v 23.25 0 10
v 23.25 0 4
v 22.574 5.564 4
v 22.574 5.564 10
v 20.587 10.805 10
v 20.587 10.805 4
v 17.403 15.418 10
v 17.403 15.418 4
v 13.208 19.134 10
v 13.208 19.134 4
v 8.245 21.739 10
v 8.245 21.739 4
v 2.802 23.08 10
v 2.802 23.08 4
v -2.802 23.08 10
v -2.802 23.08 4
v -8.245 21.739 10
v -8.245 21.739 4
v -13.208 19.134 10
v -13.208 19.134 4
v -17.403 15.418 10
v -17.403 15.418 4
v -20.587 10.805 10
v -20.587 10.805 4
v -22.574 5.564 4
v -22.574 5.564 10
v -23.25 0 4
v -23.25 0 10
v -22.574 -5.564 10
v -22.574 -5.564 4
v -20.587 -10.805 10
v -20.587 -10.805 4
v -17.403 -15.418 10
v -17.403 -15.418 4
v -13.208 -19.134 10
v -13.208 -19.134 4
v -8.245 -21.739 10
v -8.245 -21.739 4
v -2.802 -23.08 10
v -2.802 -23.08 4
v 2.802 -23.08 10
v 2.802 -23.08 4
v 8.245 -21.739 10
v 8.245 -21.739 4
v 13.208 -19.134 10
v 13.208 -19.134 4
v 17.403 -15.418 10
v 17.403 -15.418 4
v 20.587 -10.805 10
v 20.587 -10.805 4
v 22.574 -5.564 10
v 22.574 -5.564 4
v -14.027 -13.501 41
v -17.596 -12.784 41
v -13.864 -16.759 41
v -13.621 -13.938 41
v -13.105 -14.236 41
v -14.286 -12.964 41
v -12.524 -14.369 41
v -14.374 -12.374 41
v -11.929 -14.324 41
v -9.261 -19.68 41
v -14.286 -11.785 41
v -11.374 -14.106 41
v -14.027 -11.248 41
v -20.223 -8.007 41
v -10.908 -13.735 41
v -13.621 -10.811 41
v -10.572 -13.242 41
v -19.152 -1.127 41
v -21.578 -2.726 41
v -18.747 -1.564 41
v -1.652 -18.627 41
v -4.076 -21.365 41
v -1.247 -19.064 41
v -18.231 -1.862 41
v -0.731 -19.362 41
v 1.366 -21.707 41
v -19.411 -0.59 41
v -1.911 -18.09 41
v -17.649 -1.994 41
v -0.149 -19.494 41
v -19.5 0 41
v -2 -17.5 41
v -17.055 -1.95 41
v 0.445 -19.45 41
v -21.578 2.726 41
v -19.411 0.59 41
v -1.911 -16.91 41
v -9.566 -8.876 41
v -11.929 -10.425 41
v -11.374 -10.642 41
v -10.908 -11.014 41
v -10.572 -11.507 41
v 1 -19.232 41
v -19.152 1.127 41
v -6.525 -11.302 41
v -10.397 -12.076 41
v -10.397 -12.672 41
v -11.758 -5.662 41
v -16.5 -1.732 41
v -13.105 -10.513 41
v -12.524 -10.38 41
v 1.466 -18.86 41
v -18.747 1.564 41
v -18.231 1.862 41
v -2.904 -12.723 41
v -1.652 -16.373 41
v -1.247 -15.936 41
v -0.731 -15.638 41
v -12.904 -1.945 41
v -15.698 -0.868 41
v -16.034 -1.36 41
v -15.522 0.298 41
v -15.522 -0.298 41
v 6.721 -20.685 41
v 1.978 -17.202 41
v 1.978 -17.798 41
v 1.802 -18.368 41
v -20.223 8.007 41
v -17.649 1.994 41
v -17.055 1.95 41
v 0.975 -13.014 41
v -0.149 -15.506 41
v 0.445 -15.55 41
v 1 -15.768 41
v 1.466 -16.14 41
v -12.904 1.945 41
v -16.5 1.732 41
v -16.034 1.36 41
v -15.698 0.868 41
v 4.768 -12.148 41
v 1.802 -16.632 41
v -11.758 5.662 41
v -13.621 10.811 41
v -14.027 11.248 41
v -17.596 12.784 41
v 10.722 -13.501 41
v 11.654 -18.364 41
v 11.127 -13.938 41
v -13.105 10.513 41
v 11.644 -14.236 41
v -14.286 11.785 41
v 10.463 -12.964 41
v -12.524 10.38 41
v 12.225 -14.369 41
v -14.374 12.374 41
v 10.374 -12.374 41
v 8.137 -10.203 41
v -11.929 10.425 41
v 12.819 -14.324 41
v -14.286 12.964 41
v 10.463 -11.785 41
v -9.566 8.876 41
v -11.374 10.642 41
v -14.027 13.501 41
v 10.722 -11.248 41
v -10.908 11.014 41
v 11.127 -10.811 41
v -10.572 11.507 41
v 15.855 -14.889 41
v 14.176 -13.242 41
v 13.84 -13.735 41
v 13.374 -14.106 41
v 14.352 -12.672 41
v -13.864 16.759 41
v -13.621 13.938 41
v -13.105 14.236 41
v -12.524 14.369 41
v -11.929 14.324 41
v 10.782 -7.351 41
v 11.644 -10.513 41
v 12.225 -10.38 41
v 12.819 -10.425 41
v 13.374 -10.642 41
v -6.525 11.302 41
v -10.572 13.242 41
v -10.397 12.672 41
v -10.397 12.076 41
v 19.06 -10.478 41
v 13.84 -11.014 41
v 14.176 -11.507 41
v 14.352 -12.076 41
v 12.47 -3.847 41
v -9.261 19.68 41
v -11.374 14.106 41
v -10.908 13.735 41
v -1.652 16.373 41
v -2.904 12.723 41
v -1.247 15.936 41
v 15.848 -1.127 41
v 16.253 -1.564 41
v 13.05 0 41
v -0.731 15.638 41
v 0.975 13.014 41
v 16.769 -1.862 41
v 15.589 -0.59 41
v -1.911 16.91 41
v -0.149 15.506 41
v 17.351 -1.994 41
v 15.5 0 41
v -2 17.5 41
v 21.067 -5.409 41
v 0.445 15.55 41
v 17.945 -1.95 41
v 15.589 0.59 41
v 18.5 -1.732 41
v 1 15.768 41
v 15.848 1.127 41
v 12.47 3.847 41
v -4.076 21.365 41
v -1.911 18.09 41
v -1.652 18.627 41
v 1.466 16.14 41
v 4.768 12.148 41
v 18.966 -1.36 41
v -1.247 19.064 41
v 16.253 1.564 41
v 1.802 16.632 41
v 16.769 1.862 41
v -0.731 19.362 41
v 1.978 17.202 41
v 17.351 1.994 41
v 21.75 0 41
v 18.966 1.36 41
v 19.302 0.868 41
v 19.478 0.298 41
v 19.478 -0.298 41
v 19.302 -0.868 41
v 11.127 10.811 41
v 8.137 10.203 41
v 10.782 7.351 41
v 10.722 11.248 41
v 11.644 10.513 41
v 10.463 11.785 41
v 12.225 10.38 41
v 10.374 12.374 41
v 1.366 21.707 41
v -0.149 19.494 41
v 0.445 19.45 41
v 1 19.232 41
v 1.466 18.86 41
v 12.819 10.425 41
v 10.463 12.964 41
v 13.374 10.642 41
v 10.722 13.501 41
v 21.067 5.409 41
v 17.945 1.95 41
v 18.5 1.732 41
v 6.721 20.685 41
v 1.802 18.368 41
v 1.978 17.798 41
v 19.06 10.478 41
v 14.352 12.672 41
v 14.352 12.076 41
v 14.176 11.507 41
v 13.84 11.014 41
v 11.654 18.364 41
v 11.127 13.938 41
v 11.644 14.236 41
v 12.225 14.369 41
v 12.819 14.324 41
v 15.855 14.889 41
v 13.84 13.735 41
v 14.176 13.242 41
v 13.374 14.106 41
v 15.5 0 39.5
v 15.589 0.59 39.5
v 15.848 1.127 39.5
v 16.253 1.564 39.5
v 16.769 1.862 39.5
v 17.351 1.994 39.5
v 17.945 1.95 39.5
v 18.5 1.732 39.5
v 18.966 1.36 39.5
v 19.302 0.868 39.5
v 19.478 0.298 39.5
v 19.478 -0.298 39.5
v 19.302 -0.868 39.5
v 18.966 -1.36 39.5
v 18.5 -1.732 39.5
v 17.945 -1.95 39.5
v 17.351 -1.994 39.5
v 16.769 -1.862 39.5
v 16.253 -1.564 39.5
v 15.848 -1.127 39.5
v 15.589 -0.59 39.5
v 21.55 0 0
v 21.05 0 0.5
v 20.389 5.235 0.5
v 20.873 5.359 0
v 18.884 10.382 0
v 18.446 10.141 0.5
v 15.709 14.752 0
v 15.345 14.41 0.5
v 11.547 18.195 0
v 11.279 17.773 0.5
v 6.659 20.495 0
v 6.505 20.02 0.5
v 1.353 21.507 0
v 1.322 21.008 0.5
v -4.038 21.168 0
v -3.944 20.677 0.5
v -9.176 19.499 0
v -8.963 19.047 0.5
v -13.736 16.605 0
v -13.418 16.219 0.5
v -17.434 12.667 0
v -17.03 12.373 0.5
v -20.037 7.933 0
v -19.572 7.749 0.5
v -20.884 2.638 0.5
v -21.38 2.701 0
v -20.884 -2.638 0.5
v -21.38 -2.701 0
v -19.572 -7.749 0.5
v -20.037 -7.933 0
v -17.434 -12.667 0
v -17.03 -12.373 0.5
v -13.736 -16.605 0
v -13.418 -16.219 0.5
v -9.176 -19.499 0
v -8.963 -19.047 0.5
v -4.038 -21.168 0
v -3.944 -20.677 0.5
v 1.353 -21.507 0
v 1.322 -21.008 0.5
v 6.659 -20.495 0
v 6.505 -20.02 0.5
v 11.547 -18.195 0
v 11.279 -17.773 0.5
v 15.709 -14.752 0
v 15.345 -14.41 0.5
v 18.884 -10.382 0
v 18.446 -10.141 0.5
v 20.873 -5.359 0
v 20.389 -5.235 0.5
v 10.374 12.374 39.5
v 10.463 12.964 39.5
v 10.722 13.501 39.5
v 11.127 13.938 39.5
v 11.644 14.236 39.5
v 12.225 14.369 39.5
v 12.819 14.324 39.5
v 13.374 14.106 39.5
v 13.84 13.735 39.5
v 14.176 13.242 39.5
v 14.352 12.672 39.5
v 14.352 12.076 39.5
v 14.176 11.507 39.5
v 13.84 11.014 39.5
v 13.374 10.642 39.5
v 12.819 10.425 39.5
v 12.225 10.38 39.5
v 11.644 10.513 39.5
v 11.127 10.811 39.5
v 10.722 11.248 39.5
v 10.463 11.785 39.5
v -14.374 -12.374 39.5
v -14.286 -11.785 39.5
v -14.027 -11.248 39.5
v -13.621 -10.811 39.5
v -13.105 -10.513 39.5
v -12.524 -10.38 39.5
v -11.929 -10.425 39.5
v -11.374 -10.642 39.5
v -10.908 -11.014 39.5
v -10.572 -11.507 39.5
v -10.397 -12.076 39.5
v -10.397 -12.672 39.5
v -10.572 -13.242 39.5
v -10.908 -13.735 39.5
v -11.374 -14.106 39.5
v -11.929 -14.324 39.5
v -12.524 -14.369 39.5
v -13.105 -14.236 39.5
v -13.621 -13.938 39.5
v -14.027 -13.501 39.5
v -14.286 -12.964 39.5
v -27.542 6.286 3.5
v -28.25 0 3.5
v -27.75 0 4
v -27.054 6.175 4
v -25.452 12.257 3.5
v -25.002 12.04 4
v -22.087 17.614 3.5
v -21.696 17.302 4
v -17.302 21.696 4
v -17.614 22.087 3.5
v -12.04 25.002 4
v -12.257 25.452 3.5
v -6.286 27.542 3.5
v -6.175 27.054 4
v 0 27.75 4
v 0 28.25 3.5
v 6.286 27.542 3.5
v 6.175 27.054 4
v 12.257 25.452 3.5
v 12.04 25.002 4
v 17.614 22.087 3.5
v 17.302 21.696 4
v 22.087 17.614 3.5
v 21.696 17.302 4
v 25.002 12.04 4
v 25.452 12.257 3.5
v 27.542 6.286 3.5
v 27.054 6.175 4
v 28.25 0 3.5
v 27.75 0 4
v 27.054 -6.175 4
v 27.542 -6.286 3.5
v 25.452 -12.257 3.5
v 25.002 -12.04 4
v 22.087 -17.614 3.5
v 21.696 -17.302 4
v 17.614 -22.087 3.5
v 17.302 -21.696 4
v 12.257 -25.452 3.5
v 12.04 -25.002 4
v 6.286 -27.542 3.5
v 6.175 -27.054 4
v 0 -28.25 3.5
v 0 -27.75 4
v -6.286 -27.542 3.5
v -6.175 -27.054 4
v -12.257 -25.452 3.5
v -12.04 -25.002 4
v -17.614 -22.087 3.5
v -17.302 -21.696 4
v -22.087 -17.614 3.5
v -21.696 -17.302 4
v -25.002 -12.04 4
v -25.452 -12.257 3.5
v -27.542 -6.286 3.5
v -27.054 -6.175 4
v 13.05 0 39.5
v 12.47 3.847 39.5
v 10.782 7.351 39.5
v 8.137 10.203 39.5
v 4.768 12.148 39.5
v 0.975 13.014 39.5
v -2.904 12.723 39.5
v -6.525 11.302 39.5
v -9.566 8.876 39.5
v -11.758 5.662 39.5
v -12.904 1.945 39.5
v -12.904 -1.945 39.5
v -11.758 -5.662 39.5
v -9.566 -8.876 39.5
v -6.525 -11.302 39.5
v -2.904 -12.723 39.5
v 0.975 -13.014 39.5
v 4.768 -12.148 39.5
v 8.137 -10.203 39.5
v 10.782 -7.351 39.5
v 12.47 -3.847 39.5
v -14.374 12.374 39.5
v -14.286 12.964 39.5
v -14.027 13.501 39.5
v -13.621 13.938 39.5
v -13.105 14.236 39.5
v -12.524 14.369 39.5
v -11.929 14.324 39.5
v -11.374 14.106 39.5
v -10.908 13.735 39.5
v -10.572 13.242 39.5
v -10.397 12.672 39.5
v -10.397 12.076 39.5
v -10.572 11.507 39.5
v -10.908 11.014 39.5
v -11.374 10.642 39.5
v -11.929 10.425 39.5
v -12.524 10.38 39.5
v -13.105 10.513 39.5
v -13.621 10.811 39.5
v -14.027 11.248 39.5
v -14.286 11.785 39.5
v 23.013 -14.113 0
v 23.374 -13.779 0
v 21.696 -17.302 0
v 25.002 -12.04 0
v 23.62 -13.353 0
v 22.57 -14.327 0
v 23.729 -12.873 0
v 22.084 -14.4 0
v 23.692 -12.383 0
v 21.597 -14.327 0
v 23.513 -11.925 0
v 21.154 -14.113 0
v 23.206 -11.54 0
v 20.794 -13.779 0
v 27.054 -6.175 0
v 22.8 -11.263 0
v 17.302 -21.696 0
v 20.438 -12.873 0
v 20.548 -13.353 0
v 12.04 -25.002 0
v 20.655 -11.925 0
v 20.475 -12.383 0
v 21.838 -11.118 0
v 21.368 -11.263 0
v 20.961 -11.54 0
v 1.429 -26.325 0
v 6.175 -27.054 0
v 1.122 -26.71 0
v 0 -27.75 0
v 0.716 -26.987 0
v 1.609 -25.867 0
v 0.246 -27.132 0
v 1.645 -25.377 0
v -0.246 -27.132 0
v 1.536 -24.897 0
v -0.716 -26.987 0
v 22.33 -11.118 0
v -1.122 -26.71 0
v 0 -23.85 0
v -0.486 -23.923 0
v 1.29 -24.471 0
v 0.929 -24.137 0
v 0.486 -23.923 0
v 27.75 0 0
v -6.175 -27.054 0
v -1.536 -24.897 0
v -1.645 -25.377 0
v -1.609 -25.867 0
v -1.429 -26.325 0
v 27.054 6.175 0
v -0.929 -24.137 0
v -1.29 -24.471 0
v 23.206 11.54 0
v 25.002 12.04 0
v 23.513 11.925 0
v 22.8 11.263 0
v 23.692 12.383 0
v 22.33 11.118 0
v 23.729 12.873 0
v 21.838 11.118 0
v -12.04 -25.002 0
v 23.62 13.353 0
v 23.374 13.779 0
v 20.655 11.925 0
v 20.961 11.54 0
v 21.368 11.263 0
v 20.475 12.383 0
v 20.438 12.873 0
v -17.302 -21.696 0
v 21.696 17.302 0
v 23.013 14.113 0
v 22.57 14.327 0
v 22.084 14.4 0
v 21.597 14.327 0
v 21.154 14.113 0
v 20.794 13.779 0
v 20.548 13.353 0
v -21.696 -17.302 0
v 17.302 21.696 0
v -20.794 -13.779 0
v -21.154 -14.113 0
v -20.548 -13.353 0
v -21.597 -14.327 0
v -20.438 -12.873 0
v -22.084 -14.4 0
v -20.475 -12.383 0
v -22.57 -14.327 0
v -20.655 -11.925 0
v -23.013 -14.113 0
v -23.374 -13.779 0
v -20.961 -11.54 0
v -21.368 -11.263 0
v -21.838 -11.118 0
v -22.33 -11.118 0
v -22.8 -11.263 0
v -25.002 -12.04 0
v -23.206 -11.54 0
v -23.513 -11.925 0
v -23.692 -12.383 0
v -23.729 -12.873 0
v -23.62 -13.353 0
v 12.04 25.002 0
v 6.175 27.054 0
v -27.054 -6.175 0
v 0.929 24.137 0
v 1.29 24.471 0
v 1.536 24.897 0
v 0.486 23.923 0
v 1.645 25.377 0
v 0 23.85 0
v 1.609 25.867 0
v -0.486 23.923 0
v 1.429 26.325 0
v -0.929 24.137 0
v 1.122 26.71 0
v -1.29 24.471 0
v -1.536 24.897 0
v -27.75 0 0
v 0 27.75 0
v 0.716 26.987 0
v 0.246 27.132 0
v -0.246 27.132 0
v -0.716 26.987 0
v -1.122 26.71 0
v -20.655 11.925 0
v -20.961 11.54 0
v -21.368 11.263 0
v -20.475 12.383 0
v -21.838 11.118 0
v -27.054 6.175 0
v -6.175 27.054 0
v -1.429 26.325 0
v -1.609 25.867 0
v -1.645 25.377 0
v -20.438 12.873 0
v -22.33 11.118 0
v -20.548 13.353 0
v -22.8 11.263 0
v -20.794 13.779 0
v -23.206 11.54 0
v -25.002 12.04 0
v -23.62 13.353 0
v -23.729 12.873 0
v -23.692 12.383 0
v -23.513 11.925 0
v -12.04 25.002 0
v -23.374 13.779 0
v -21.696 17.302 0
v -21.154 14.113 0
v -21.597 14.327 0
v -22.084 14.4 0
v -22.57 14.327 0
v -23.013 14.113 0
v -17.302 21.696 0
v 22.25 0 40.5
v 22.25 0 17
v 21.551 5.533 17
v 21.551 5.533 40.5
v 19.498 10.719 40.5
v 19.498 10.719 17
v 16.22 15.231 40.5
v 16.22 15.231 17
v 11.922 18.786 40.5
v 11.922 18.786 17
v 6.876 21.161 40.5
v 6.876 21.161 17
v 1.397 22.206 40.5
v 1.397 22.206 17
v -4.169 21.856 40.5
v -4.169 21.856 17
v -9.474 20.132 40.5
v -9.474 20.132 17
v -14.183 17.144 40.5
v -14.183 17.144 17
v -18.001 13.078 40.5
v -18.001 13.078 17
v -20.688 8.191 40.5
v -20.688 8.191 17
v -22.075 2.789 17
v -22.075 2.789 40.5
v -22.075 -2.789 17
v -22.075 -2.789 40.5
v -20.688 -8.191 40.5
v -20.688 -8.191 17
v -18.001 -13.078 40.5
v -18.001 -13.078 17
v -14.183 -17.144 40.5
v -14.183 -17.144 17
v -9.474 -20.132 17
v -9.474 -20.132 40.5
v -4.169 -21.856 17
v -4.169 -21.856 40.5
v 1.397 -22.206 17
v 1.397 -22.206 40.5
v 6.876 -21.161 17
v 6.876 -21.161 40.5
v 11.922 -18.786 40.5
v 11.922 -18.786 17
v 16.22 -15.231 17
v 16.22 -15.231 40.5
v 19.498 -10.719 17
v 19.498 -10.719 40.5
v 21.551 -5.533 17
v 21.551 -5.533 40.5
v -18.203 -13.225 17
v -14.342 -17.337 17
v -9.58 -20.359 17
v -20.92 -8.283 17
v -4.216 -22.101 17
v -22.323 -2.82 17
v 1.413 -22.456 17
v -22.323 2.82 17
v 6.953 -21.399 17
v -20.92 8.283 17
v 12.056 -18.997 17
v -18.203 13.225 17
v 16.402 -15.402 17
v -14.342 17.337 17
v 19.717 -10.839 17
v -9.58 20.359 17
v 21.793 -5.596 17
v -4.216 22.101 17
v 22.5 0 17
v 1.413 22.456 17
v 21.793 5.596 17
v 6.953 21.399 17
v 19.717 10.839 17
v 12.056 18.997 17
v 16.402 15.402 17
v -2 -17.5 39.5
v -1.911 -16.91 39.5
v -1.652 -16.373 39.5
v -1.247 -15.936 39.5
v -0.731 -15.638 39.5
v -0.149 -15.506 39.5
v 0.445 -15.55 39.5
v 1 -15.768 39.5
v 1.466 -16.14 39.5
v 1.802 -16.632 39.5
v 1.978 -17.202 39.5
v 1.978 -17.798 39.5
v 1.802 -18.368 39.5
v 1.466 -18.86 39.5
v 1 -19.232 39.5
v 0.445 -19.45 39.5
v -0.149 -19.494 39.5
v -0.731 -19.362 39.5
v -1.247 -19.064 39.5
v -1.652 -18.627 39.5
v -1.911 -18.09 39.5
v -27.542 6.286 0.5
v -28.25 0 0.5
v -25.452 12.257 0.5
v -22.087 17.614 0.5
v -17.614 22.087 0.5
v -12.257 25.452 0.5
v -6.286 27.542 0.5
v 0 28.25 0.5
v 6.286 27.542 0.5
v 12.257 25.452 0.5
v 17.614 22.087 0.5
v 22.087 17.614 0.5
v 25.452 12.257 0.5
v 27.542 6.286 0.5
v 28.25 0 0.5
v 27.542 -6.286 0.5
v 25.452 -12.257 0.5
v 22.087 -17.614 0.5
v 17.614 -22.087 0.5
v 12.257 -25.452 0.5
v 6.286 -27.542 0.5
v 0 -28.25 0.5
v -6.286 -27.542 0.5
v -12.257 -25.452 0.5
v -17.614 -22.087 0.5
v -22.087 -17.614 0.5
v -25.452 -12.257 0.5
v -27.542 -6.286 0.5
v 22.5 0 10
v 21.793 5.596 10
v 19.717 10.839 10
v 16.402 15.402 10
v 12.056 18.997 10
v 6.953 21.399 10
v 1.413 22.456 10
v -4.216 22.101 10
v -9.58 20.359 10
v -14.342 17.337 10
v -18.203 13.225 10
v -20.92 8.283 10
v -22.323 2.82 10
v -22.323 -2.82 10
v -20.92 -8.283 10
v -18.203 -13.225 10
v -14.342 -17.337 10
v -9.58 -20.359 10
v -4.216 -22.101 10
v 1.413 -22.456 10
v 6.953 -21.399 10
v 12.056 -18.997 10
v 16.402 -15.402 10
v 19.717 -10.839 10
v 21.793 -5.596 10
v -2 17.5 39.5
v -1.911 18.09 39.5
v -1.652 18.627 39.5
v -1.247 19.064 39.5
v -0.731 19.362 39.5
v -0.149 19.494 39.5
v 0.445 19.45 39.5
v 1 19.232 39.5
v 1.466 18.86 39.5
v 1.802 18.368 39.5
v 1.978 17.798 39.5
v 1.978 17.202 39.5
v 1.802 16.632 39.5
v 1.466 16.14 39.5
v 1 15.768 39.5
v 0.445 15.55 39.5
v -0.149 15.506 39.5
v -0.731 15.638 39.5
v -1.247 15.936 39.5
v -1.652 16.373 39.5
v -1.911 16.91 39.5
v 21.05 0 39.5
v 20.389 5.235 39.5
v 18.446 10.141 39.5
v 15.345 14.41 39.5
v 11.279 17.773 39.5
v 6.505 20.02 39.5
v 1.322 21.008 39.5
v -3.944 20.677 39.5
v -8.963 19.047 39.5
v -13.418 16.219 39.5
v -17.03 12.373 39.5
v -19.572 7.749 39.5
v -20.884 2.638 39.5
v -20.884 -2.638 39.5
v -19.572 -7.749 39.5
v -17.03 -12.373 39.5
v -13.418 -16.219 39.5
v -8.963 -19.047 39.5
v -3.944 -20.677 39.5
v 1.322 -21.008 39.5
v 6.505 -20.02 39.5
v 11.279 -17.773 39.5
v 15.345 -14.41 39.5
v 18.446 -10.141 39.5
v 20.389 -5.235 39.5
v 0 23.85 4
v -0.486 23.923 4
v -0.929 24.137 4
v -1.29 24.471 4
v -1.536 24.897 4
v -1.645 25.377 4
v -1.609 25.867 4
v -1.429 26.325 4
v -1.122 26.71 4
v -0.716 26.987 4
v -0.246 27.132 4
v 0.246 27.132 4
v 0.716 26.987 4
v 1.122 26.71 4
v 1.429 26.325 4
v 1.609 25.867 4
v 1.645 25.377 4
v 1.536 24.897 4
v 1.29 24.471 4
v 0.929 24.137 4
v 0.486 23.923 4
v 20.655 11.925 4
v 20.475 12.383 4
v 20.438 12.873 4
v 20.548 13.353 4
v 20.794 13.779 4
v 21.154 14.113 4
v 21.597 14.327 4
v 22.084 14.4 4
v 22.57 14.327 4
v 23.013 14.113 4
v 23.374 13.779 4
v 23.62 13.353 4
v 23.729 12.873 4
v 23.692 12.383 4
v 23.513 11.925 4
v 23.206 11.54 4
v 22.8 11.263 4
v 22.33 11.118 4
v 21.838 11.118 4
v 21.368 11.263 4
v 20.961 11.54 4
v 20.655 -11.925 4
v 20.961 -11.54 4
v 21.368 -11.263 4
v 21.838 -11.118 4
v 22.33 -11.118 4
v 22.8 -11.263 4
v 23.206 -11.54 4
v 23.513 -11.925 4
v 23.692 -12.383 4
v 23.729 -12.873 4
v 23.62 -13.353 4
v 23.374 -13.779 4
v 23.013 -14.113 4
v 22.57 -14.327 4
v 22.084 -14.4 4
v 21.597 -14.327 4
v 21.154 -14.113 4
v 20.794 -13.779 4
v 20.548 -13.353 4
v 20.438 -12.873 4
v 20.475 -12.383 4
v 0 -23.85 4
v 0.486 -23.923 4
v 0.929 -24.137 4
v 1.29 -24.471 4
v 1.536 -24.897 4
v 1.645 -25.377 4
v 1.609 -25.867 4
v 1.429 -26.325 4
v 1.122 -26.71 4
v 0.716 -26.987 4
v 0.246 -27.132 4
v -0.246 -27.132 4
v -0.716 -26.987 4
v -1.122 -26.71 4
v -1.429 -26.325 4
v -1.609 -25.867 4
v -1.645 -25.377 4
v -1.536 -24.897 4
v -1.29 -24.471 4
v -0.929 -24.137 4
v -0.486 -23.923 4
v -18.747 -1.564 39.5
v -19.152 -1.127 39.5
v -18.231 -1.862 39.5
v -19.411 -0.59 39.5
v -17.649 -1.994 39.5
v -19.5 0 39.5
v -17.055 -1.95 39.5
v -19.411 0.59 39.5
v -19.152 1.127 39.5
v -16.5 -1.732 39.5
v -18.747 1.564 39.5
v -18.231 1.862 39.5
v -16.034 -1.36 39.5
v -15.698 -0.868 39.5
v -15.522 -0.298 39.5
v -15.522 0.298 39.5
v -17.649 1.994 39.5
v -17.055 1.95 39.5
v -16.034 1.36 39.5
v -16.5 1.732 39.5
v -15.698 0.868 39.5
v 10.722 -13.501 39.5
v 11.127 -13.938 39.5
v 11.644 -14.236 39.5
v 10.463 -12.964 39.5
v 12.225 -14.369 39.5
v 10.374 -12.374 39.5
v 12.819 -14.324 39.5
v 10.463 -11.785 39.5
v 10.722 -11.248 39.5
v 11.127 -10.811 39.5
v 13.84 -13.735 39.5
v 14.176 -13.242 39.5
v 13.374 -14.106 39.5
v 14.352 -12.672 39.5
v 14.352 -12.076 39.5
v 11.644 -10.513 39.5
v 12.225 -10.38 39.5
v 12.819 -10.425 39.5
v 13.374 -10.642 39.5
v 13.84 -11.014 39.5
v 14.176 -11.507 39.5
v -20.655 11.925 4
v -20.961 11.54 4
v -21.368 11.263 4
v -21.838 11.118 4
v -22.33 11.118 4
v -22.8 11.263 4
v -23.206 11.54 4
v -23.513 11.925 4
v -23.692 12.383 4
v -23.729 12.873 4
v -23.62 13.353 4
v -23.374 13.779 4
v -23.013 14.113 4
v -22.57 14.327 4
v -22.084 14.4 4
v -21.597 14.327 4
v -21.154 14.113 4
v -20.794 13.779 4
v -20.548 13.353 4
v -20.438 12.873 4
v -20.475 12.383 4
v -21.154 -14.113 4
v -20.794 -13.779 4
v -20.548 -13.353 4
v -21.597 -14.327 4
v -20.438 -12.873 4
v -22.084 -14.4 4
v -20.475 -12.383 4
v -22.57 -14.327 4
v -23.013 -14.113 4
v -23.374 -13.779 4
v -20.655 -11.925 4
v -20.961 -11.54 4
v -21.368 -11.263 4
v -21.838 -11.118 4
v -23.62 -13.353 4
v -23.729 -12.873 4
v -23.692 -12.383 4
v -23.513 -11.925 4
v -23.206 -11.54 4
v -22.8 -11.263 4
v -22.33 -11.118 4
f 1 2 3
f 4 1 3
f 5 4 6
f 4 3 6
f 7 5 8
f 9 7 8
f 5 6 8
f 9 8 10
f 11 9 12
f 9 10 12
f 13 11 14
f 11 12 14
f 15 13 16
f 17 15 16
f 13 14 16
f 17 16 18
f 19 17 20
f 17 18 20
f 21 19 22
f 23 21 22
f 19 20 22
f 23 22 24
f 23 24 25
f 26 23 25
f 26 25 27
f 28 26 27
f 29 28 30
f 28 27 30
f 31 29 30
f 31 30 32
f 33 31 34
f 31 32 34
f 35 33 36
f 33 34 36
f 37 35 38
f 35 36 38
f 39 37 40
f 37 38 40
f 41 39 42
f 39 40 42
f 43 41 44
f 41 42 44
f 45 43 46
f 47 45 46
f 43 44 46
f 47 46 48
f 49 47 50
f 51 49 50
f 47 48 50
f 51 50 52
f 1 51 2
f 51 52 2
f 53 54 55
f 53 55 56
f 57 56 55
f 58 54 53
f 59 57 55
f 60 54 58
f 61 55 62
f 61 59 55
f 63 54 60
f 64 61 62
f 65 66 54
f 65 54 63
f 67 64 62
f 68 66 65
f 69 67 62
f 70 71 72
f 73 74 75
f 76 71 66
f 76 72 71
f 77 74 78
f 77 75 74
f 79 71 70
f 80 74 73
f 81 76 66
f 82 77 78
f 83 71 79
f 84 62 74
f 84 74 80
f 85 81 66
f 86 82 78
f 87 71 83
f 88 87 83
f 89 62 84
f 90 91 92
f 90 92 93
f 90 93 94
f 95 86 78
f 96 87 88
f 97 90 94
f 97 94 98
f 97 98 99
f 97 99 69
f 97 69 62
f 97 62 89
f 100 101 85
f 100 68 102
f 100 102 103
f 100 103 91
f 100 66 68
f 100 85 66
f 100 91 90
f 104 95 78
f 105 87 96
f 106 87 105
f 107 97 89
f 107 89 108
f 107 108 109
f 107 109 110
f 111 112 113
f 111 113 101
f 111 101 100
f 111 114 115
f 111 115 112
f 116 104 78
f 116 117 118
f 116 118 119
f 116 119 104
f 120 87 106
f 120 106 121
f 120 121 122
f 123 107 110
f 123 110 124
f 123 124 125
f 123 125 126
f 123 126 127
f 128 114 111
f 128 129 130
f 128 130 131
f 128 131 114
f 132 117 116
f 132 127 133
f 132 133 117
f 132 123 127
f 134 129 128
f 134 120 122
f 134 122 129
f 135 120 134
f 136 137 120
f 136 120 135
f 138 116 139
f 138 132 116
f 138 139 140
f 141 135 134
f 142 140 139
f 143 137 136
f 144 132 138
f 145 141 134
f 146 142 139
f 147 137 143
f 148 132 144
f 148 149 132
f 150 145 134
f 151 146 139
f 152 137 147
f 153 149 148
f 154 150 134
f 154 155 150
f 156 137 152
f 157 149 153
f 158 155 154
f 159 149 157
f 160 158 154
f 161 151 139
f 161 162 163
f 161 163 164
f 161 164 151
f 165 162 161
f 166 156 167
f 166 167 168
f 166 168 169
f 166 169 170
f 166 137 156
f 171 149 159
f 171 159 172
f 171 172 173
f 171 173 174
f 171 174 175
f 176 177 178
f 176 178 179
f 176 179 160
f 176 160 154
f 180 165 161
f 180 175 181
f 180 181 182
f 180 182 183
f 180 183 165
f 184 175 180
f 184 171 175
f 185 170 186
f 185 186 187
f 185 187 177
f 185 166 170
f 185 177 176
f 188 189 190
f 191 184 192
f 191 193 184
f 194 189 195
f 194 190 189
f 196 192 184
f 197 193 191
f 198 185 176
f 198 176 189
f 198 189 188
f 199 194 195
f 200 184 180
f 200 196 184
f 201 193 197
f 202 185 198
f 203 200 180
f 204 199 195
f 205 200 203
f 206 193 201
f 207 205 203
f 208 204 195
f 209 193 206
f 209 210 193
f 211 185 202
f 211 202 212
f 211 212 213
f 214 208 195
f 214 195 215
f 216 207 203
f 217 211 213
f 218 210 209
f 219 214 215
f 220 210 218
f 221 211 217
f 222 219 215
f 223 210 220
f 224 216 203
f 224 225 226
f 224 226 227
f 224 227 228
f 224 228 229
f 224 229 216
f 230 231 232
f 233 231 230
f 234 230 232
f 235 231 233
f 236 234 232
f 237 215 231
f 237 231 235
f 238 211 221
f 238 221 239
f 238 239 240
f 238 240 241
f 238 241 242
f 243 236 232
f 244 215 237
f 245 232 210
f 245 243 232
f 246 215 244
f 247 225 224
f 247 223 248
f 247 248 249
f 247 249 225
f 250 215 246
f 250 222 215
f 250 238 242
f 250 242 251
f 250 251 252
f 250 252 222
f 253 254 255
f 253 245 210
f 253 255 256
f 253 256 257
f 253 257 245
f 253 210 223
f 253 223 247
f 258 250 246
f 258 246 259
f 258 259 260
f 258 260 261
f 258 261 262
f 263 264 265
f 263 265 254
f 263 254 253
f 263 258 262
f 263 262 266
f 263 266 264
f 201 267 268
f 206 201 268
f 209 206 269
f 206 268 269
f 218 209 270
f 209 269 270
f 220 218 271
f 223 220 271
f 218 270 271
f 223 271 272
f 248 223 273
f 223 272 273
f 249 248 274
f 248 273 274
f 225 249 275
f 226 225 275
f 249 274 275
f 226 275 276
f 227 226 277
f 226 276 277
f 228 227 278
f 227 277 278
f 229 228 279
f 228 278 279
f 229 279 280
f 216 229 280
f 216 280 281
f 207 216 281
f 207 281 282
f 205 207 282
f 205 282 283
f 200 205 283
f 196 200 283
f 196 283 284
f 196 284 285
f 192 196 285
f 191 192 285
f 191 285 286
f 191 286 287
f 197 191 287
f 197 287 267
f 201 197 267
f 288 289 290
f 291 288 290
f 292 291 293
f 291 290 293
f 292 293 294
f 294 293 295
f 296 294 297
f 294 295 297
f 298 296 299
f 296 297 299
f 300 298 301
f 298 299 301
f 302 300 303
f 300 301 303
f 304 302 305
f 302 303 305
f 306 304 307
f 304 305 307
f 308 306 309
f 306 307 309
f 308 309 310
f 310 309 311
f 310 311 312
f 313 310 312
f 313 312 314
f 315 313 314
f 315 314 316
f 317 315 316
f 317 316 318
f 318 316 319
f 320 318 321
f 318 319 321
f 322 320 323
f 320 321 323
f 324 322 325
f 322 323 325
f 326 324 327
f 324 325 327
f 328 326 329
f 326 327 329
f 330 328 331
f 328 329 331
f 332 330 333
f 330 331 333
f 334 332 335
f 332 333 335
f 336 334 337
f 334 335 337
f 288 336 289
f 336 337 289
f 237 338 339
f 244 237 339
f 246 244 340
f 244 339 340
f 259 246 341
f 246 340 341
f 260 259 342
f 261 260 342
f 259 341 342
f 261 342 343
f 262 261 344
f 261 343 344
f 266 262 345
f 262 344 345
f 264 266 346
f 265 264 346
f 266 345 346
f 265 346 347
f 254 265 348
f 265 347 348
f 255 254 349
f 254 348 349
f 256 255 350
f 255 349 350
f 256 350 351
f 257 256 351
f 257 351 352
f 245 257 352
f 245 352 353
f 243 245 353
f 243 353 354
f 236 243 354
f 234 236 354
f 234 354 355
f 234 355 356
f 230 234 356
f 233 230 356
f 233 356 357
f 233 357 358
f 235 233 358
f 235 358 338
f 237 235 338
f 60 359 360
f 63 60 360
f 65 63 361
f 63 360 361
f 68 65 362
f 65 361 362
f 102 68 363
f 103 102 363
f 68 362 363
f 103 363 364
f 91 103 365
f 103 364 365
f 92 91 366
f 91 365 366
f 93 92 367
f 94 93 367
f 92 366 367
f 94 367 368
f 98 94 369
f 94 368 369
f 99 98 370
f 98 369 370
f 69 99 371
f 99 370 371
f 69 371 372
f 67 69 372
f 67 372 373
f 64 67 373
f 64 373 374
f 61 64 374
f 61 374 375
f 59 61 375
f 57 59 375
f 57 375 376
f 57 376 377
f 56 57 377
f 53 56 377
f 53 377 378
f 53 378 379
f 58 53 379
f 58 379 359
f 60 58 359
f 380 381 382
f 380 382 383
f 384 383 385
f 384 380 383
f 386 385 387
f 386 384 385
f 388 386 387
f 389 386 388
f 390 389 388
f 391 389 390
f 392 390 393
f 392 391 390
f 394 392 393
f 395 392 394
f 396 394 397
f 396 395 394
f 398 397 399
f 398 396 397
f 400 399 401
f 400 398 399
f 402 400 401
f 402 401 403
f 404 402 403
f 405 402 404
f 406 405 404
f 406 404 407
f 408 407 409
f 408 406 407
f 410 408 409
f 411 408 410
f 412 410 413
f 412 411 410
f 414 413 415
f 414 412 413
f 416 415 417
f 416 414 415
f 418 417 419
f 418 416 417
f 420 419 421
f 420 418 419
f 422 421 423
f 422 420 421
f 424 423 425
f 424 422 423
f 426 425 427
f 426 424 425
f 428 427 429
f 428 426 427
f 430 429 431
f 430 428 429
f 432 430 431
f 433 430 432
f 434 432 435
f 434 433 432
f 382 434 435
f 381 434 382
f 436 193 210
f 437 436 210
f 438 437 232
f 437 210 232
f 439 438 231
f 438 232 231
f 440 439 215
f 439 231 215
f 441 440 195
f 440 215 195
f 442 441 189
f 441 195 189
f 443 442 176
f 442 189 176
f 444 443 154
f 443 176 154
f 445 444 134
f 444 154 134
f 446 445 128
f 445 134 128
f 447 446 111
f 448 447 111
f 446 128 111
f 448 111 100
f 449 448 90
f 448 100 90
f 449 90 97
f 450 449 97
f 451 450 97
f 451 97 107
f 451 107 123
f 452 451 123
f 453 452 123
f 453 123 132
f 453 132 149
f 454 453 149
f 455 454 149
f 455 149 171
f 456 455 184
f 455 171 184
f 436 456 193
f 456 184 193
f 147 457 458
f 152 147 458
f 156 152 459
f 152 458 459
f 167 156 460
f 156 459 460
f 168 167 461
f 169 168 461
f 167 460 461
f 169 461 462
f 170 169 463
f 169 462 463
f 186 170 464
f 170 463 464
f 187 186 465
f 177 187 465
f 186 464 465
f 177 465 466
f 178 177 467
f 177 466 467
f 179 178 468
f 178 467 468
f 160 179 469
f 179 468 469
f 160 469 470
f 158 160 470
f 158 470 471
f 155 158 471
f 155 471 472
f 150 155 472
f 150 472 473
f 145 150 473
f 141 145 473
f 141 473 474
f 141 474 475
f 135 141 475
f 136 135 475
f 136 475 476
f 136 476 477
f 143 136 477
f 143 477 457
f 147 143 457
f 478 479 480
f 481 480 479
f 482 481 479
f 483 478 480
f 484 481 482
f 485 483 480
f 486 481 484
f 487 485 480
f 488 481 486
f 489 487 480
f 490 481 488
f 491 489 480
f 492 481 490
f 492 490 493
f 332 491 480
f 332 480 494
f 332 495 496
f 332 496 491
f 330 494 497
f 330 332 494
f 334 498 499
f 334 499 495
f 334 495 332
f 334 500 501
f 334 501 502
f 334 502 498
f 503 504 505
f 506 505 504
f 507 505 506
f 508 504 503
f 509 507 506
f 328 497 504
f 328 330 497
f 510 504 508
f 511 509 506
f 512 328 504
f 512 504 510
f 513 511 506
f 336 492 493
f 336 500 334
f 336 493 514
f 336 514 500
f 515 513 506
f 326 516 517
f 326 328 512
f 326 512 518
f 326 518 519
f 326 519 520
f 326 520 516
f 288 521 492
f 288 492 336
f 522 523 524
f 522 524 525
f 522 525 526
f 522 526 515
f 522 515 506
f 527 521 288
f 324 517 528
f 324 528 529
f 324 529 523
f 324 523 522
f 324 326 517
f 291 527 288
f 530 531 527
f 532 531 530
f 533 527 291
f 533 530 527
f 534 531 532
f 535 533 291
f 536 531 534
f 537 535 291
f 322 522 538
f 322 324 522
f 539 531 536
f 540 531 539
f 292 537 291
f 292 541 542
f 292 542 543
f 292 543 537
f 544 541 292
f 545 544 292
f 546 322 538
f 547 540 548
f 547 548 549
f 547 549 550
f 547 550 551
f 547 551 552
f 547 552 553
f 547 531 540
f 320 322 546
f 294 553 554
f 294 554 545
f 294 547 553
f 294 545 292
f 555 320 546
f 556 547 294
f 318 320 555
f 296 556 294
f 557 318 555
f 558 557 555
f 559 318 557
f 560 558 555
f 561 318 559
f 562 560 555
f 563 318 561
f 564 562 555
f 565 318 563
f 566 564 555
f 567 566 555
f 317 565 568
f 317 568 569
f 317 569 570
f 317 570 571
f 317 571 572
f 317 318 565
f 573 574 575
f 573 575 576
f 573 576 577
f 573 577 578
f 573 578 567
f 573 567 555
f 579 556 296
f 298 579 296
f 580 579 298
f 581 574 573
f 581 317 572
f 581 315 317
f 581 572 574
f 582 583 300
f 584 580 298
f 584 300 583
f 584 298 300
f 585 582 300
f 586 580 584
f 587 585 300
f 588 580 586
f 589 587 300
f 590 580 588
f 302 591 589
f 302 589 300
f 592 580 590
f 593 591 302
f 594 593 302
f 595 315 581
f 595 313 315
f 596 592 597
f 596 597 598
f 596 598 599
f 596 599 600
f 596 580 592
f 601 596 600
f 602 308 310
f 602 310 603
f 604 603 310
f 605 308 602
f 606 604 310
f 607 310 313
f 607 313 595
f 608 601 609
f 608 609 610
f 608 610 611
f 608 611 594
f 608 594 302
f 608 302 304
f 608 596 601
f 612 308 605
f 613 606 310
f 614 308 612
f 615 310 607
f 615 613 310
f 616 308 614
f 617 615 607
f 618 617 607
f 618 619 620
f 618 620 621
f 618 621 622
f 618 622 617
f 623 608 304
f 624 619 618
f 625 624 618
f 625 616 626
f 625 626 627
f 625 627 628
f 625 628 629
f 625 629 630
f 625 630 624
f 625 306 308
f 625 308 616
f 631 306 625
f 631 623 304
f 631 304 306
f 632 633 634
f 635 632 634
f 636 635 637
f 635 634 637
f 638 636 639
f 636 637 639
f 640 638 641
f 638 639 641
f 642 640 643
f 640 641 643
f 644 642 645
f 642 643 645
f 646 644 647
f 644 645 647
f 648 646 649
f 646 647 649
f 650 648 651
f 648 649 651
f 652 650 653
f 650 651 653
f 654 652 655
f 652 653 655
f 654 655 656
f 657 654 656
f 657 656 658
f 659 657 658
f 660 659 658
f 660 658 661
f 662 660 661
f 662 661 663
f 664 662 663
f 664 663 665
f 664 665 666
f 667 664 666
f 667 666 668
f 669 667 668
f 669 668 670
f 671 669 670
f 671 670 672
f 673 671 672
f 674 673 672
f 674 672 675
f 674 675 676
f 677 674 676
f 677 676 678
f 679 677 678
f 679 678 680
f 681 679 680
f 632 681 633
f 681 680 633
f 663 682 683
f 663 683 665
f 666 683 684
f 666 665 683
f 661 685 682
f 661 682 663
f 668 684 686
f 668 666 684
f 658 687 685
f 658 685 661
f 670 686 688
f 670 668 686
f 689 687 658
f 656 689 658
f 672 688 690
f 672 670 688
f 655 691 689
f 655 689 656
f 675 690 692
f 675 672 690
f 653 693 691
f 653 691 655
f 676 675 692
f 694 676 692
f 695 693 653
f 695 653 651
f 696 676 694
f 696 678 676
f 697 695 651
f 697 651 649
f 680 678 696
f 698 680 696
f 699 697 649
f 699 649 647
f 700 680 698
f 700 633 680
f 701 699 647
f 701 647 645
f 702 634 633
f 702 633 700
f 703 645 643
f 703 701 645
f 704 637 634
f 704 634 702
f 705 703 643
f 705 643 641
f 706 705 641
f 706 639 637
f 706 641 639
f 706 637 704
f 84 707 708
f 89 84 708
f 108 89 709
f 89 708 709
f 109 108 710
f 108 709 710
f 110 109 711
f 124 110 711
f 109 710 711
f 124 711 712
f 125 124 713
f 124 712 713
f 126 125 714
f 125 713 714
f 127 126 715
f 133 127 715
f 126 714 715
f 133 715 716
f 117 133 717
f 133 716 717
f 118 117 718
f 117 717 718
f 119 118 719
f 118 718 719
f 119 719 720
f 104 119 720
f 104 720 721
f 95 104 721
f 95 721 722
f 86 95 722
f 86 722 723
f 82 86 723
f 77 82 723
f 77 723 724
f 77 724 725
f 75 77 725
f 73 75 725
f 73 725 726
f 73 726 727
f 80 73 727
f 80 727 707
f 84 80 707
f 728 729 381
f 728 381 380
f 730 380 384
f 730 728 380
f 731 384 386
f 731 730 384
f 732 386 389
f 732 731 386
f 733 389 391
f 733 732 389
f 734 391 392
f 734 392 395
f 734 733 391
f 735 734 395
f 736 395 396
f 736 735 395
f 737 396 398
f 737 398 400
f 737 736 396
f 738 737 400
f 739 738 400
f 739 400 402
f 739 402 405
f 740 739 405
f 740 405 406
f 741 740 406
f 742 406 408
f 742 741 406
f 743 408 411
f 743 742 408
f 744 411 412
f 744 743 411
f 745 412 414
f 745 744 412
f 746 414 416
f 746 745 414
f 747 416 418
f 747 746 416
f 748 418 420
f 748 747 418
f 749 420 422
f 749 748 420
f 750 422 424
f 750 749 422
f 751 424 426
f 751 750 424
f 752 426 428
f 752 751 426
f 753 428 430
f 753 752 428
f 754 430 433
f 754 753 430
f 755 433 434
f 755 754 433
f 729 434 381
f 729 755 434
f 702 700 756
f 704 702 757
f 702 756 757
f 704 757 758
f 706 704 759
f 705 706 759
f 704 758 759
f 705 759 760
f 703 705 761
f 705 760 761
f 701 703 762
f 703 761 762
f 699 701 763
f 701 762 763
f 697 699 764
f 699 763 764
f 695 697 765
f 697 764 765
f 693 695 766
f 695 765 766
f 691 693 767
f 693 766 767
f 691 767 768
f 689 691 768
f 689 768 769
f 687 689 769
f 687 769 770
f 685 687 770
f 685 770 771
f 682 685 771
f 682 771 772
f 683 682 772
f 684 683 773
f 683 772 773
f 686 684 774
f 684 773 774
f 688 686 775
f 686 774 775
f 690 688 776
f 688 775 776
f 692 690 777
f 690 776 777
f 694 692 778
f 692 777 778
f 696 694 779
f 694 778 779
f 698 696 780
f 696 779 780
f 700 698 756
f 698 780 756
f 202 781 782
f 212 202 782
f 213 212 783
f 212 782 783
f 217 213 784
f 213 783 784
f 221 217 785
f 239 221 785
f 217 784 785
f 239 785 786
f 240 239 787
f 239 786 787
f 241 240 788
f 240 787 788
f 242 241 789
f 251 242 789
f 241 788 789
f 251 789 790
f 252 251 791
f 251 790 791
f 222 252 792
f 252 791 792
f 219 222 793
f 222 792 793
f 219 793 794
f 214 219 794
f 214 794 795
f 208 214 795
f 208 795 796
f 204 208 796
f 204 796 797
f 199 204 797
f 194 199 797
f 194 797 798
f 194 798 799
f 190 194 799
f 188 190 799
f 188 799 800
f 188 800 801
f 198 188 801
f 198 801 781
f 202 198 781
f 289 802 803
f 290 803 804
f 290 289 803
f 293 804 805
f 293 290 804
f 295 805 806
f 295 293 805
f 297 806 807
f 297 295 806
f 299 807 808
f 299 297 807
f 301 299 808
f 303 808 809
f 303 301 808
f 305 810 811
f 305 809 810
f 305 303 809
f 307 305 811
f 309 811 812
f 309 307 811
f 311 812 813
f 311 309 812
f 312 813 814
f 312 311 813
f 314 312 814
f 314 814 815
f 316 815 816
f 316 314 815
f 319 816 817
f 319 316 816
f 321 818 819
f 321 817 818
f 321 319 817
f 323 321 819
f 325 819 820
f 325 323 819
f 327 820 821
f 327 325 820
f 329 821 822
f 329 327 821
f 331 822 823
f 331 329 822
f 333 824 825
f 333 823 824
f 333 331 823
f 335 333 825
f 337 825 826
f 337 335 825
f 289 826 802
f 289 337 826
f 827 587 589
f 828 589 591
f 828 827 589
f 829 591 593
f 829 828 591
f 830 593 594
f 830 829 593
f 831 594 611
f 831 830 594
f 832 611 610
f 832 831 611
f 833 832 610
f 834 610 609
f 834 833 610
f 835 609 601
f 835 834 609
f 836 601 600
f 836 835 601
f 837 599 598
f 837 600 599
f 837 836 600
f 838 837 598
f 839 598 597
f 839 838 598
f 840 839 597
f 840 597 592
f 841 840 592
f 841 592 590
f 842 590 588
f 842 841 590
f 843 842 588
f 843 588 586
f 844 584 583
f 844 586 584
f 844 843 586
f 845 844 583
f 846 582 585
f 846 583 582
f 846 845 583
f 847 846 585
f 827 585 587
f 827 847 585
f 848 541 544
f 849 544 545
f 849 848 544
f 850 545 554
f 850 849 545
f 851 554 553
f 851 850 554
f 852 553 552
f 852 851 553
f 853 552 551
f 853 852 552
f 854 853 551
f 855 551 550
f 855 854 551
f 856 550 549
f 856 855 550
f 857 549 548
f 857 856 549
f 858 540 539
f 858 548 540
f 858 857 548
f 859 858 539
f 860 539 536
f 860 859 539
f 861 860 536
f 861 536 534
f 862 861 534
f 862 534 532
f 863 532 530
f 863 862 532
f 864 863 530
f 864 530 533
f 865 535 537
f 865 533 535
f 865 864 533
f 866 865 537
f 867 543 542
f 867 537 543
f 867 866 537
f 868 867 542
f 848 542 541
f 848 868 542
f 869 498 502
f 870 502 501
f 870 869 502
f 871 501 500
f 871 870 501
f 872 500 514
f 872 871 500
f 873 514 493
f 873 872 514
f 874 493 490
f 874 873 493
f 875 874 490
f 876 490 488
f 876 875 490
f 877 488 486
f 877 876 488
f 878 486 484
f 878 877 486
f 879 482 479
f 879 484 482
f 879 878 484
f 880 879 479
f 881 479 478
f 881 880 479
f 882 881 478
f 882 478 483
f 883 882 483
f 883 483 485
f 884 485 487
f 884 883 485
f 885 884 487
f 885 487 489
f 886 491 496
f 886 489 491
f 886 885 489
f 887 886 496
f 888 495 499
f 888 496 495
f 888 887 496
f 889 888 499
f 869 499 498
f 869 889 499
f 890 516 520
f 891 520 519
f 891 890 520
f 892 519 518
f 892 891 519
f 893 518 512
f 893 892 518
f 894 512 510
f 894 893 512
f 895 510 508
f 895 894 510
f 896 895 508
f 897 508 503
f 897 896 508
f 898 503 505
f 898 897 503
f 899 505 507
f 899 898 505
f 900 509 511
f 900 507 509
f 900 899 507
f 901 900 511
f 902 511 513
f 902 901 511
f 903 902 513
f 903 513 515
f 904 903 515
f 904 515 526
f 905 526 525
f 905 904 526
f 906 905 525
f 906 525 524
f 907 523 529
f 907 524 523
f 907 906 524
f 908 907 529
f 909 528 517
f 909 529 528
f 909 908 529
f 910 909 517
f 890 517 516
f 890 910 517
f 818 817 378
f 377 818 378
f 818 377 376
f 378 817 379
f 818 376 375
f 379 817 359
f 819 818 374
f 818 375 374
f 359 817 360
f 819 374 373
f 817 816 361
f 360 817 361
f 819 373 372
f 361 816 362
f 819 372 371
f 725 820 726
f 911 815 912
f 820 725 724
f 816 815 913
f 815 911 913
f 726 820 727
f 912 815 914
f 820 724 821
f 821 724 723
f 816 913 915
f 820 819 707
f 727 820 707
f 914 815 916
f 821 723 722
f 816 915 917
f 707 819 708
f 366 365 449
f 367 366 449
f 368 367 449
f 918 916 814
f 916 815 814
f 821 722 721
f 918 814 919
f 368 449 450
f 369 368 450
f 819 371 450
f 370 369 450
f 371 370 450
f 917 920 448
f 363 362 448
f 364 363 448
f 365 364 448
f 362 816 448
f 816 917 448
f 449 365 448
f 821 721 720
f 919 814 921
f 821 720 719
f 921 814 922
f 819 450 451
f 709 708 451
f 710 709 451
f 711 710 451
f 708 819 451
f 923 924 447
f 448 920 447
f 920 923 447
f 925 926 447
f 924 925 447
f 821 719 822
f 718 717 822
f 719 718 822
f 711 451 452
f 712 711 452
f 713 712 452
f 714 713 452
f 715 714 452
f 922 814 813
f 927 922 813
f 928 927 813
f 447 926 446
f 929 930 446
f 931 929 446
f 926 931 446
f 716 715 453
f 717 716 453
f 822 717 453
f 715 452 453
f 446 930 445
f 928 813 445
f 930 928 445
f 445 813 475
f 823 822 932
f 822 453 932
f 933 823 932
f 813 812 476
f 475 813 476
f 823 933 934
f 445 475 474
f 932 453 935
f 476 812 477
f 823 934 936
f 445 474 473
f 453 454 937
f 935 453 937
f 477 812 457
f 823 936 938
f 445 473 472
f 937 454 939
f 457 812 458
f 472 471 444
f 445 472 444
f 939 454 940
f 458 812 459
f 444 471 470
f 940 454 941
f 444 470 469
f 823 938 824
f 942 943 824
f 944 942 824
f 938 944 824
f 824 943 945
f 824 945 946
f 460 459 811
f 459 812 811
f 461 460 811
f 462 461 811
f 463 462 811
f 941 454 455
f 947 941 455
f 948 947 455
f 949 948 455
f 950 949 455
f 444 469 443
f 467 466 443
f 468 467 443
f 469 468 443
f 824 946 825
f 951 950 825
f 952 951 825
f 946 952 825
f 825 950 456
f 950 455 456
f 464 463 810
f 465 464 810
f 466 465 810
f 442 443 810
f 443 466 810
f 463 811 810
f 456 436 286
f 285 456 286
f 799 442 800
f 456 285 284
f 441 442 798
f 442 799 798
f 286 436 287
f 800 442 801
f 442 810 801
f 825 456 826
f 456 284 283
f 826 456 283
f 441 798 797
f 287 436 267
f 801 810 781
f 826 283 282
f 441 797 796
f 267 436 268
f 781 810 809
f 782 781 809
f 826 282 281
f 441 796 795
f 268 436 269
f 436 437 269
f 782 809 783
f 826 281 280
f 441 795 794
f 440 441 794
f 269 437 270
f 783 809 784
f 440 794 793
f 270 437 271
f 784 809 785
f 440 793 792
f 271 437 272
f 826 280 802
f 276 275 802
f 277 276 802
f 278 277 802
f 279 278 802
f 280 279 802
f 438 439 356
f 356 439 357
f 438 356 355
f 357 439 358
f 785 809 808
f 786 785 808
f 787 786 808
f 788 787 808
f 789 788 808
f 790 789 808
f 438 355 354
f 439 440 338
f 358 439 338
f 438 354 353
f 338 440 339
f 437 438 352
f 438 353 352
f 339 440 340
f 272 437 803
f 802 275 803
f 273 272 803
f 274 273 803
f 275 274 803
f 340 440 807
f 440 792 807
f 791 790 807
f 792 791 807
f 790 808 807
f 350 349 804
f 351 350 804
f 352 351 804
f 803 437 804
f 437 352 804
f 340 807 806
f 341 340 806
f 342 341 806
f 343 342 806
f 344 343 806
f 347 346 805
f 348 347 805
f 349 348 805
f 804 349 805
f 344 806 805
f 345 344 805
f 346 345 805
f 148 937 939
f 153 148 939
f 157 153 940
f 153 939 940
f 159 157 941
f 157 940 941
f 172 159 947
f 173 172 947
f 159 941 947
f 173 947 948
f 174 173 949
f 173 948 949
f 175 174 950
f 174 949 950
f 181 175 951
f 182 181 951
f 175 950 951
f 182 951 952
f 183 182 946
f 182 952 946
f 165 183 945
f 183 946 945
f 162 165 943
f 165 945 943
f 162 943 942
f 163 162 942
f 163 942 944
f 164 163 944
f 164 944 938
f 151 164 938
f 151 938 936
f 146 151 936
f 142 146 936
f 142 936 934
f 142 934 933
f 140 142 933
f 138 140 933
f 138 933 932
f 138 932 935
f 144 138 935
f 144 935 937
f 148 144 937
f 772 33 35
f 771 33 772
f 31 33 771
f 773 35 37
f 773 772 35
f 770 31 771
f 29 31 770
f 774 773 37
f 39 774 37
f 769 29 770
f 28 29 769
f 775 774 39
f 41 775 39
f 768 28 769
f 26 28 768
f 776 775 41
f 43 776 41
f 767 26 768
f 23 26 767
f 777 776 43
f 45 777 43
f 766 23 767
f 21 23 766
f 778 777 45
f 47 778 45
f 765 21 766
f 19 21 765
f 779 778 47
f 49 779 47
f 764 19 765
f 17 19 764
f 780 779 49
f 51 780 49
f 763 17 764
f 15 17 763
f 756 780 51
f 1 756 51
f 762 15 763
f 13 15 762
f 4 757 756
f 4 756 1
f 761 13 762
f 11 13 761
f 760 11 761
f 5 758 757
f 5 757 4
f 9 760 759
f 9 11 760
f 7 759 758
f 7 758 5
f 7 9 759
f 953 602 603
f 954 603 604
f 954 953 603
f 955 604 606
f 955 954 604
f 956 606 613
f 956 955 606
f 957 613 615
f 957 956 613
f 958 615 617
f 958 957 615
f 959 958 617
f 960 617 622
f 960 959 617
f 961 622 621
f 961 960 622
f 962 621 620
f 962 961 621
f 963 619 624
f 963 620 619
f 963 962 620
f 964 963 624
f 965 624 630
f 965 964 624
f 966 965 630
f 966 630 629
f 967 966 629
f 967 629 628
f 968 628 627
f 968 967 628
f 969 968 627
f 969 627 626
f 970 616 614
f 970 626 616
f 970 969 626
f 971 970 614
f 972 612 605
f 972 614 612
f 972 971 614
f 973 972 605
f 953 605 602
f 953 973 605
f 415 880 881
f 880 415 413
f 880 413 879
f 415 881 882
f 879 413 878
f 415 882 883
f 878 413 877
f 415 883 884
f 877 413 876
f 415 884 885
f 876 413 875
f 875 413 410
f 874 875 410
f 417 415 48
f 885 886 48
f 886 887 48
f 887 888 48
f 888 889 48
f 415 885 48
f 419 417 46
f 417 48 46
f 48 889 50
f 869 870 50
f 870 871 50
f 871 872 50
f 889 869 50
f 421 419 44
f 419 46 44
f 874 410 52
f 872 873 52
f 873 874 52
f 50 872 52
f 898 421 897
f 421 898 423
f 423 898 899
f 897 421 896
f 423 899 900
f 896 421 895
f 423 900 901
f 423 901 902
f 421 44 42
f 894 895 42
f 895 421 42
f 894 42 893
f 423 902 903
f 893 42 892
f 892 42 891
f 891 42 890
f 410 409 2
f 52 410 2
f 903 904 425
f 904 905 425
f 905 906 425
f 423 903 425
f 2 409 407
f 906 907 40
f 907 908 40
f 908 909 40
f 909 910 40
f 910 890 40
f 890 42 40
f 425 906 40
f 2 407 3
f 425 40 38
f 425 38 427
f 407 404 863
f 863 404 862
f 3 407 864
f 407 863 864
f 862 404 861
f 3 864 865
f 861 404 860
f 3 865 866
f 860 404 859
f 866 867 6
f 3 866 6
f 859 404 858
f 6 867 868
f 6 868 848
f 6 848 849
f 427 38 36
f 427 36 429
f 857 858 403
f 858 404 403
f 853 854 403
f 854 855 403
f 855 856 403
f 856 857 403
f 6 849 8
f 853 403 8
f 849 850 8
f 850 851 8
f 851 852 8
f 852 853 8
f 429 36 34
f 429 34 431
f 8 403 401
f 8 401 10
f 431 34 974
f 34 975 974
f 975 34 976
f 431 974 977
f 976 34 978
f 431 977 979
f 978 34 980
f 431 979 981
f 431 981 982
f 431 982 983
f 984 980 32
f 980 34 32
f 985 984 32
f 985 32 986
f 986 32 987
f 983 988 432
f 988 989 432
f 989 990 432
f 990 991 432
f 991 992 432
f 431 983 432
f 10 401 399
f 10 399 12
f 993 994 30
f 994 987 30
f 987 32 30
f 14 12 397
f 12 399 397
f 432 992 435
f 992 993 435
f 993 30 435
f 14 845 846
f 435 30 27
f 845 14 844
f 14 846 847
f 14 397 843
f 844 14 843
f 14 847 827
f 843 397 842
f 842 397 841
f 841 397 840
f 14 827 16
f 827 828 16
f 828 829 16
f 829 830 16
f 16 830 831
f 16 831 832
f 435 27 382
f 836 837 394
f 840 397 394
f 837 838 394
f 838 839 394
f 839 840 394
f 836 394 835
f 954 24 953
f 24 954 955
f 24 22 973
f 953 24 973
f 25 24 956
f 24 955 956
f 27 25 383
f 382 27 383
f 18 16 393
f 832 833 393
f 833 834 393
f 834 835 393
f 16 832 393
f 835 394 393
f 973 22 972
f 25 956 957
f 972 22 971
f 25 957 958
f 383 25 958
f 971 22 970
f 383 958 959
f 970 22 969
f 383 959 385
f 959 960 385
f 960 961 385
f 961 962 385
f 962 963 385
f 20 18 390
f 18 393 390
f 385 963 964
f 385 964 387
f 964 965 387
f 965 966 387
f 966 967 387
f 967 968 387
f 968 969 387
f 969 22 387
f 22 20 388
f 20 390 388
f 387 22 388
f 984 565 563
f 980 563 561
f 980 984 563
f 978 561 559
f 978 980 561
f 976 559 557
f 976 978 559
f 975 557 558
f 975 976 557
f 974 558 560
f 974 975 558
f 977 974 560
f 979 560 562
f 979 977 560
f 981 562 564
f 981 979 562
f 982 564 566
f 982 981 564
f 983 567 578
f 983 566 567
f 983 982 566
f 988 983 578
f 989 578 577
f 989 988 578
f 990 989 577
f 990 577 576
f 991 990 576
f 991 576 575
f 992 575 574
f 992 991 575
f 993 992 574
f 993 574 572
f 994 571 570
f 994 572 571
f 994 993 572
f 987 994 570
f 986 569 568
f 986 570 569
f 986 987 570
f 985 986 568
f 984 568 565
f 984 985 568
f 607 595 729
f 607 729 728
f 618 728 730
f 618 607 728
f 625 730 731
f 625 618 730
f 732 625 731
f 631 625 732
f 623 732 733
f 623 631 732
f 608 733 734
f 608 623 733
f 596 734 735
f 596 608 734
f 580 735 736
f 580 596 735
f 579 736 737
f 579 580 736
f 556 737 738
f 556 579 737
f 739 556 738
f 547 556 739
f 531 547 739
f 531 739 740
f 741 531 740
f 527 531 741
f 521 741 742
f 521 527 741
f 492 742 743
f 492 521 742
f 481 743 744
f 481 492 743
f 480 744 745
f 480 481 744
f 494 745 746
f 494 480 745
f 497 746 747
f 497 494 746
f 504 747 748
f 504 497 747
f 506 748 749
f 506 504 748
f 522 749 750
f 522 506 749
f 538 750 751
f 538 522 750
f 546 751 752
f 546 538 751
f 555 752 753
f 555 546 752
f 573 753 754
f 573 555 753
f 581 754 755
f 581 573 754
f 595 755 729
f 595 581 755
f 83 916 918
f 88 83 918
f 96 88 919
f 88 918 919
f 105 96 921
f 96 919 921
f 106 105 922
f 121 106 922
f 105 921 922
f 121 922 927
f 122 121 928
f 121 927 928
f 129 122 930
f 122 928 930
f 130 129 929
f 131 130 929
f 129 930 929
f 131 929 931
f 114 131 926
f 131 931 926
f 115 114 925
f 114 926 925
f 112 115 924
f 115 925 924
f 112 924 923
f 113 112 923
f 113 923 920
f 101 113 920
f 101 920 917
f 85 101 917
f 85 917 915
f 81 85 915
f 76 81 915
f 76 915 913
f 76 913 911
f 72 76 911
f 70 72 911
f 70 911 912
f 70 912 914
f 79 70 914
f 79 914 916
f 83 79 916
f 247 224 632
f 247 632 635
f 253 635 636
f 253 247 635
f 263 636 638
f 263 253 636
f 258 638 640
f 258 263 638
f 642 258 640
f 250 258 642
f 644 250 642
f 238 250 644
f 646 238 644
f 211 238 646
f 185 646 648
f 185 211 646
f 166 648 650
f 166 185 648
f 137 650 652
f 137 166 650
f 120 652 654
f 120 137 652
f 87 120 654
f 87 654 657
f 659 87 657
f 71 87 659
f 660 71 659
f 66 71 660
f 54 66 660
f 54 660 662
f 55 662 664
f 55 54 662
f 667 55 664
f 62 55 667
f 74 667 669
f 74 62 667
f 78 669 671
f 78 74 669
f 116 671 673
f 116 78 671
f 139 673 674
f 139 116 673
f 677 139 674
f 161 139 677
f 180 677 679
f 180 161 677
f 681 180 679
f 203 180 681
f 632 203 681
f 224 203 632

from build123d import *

# Parameters (mm, degrees)
SKETCH_1_R               = 22.25
SKETCH_1_R_2             = 21.05
EXTRUDE_1_DEPTH          = 41
SKETCH_2_R               = 22.25
SKETCH_2_R_2             = 13.05
EXTRUDE_2_DEPTH          = 1.5
SKETCH_3_R               = 28.25
SKETCH_3_R_2             = 21.05
EXTRUDE_3_DEPTH          = 4
SKETCH_4_R               = 23.25
SKETCH_4_R_2             = 22.25
EXTRUDE_4_DEPTH          = 6
SKETCH_5_R               = 22.5
SKETCH_5_R_2             = 22.25
EXTRUDE_5_DEPTH          = 7
SKETCH_6_R               = 2
CUT_EXTRUDE_1_DEPTH      = 7
PATTERN_CIRCULAR_1_COUNT = 6
CHAMFER_1_SIZE           = 0.5


with BuildPart() as part:
    # 草图1 → 凸台-拉伸1 (new body)
    with BuildSketch(Plane.XY):
        Circle(SKETCH_1_R)
        Circle(SKETCH_1_R_2, mode=Mode.SUBTRACT)
    extrude(amount=EXTRUDE_1_DEPTH)

    # 草图2 → 凸台-拉伸2 (add)
    with BuildSketch(Plane.XY.offset(41)):
        Circle(SKETCH_2_R)
        Circle(SKETCH_2_R_2, mode=Mode.SUBTRACT)
    extrude(amount=-EXTRUDE_2_DEPTH)

    # 草图3 → 凸台-拉伸3 (add)
    with BuildSketch(Plane(origin=(0, 0, 0), x_dir=(-1, 0, 0), z_dir=(0, 0, -1))):
        Circle(SKETCH_3_R)
        Circle(SKETCH_3_R_2, mode=Mode.SUBTRACT)
    extrude(amount=-EXTRUDE_3_DEPTH)

    # 草图4 → 凸台-拉伸4 (add)
    with BuildSketch(Plane.XY.offset(4)):
        Circle(SKETCH_4_R)
        Circle(SKETCH_4_R_2, mode=Mode.SUBTRACT)
    extrude(amount=EXTRUDE_4_DEPTH)

    # 草图5 → 凸台-拉伸5 (add)
    with BuildSketch(Plane.XY.offset(10)):
        Circle(SKETCH_5_R)
        Circle(SKETCH_5_R_2, mode=Mode.SUBTRACT)
    extrude(amount=EXTRUDE_5_DEPTH)

    # 草图6 → 切除-拉伸1 (cut)
    with BuildSketch(Plane(origin=(0, 0, 39.5), x_dir=(-1, 0, 0), z_dir=(0, 0, -1))):
        with Locations((12.374368671, 12.374368671)):
            Circle(SKETCH_6_R)
        with Locations((17.5, 0)):
            Circle(SKETCH_6_R)
        with Locations((12.374368671, -12.374368671)):
            Circle(SKETCH_6_R)
        with Locations((0, -17.5)):
            Circle(SKETCH_6_R)
        with Locations((-12.374368671, -12.374368671)):
            Circle(SKETCH_6_R)
        with Locations((-17.5, 0)):
            Circle(SKETCH_6_R)
        with Locations((-12.374368671, 12.374368671)):
            Circle(SKETCH_6_R)
        with Locations((0, 17.5)):
            Circle(SKETCH_6_R)
    extrude(amount=-CUT_EXTRUDE_1_DEPTH, mode=Mode.SUBTRACT)

    # 草图9 → M4 螺纹孔1 (revolve, cut)
    with BuildSketch(Plane(origin=(0, 25.5, 4), x_dir=(0, -1, 0), z_dir=(1, 0, 0))):
        Polygon((0, 0), (0, 11.091420021), (1.65, 10.1), (1.65, 0), align=None)
    hole_wizard_m4_1 = revolve(axis=Axis((0, 25.5, 10.35), (0, 0, -1)), mode=Mode.SUBTRACT)

    # 阵列(圆周)1: M4 螺纹孔1 ×6 about axis
    pattern_circular_1_axis = Axis((0, 0, 0), (0, 0, 1))
    for i in range(1, PATTERN_CIRCULAR_1_COUNT):
        add(hole_wizard_m4_1.rotate(pattern_circular_1_axis, i * 360 / PATTERN_CIRCULAR_1_COUNT), mode=Mode.SUBTRACT)

    # 倒角1
    chamfer_1_edges = [part.edges().sort_by_distance(p)[0] for p in [
        (28.25, 0, 4),
        (28.25, 0, 0),
        (-22.25, 0, 41),
        (-21.05, 0, 0),
    ]]
    chamfer(chamfer_1_edges, length=CHAMFER_1_SIZE)


solid = part.part
